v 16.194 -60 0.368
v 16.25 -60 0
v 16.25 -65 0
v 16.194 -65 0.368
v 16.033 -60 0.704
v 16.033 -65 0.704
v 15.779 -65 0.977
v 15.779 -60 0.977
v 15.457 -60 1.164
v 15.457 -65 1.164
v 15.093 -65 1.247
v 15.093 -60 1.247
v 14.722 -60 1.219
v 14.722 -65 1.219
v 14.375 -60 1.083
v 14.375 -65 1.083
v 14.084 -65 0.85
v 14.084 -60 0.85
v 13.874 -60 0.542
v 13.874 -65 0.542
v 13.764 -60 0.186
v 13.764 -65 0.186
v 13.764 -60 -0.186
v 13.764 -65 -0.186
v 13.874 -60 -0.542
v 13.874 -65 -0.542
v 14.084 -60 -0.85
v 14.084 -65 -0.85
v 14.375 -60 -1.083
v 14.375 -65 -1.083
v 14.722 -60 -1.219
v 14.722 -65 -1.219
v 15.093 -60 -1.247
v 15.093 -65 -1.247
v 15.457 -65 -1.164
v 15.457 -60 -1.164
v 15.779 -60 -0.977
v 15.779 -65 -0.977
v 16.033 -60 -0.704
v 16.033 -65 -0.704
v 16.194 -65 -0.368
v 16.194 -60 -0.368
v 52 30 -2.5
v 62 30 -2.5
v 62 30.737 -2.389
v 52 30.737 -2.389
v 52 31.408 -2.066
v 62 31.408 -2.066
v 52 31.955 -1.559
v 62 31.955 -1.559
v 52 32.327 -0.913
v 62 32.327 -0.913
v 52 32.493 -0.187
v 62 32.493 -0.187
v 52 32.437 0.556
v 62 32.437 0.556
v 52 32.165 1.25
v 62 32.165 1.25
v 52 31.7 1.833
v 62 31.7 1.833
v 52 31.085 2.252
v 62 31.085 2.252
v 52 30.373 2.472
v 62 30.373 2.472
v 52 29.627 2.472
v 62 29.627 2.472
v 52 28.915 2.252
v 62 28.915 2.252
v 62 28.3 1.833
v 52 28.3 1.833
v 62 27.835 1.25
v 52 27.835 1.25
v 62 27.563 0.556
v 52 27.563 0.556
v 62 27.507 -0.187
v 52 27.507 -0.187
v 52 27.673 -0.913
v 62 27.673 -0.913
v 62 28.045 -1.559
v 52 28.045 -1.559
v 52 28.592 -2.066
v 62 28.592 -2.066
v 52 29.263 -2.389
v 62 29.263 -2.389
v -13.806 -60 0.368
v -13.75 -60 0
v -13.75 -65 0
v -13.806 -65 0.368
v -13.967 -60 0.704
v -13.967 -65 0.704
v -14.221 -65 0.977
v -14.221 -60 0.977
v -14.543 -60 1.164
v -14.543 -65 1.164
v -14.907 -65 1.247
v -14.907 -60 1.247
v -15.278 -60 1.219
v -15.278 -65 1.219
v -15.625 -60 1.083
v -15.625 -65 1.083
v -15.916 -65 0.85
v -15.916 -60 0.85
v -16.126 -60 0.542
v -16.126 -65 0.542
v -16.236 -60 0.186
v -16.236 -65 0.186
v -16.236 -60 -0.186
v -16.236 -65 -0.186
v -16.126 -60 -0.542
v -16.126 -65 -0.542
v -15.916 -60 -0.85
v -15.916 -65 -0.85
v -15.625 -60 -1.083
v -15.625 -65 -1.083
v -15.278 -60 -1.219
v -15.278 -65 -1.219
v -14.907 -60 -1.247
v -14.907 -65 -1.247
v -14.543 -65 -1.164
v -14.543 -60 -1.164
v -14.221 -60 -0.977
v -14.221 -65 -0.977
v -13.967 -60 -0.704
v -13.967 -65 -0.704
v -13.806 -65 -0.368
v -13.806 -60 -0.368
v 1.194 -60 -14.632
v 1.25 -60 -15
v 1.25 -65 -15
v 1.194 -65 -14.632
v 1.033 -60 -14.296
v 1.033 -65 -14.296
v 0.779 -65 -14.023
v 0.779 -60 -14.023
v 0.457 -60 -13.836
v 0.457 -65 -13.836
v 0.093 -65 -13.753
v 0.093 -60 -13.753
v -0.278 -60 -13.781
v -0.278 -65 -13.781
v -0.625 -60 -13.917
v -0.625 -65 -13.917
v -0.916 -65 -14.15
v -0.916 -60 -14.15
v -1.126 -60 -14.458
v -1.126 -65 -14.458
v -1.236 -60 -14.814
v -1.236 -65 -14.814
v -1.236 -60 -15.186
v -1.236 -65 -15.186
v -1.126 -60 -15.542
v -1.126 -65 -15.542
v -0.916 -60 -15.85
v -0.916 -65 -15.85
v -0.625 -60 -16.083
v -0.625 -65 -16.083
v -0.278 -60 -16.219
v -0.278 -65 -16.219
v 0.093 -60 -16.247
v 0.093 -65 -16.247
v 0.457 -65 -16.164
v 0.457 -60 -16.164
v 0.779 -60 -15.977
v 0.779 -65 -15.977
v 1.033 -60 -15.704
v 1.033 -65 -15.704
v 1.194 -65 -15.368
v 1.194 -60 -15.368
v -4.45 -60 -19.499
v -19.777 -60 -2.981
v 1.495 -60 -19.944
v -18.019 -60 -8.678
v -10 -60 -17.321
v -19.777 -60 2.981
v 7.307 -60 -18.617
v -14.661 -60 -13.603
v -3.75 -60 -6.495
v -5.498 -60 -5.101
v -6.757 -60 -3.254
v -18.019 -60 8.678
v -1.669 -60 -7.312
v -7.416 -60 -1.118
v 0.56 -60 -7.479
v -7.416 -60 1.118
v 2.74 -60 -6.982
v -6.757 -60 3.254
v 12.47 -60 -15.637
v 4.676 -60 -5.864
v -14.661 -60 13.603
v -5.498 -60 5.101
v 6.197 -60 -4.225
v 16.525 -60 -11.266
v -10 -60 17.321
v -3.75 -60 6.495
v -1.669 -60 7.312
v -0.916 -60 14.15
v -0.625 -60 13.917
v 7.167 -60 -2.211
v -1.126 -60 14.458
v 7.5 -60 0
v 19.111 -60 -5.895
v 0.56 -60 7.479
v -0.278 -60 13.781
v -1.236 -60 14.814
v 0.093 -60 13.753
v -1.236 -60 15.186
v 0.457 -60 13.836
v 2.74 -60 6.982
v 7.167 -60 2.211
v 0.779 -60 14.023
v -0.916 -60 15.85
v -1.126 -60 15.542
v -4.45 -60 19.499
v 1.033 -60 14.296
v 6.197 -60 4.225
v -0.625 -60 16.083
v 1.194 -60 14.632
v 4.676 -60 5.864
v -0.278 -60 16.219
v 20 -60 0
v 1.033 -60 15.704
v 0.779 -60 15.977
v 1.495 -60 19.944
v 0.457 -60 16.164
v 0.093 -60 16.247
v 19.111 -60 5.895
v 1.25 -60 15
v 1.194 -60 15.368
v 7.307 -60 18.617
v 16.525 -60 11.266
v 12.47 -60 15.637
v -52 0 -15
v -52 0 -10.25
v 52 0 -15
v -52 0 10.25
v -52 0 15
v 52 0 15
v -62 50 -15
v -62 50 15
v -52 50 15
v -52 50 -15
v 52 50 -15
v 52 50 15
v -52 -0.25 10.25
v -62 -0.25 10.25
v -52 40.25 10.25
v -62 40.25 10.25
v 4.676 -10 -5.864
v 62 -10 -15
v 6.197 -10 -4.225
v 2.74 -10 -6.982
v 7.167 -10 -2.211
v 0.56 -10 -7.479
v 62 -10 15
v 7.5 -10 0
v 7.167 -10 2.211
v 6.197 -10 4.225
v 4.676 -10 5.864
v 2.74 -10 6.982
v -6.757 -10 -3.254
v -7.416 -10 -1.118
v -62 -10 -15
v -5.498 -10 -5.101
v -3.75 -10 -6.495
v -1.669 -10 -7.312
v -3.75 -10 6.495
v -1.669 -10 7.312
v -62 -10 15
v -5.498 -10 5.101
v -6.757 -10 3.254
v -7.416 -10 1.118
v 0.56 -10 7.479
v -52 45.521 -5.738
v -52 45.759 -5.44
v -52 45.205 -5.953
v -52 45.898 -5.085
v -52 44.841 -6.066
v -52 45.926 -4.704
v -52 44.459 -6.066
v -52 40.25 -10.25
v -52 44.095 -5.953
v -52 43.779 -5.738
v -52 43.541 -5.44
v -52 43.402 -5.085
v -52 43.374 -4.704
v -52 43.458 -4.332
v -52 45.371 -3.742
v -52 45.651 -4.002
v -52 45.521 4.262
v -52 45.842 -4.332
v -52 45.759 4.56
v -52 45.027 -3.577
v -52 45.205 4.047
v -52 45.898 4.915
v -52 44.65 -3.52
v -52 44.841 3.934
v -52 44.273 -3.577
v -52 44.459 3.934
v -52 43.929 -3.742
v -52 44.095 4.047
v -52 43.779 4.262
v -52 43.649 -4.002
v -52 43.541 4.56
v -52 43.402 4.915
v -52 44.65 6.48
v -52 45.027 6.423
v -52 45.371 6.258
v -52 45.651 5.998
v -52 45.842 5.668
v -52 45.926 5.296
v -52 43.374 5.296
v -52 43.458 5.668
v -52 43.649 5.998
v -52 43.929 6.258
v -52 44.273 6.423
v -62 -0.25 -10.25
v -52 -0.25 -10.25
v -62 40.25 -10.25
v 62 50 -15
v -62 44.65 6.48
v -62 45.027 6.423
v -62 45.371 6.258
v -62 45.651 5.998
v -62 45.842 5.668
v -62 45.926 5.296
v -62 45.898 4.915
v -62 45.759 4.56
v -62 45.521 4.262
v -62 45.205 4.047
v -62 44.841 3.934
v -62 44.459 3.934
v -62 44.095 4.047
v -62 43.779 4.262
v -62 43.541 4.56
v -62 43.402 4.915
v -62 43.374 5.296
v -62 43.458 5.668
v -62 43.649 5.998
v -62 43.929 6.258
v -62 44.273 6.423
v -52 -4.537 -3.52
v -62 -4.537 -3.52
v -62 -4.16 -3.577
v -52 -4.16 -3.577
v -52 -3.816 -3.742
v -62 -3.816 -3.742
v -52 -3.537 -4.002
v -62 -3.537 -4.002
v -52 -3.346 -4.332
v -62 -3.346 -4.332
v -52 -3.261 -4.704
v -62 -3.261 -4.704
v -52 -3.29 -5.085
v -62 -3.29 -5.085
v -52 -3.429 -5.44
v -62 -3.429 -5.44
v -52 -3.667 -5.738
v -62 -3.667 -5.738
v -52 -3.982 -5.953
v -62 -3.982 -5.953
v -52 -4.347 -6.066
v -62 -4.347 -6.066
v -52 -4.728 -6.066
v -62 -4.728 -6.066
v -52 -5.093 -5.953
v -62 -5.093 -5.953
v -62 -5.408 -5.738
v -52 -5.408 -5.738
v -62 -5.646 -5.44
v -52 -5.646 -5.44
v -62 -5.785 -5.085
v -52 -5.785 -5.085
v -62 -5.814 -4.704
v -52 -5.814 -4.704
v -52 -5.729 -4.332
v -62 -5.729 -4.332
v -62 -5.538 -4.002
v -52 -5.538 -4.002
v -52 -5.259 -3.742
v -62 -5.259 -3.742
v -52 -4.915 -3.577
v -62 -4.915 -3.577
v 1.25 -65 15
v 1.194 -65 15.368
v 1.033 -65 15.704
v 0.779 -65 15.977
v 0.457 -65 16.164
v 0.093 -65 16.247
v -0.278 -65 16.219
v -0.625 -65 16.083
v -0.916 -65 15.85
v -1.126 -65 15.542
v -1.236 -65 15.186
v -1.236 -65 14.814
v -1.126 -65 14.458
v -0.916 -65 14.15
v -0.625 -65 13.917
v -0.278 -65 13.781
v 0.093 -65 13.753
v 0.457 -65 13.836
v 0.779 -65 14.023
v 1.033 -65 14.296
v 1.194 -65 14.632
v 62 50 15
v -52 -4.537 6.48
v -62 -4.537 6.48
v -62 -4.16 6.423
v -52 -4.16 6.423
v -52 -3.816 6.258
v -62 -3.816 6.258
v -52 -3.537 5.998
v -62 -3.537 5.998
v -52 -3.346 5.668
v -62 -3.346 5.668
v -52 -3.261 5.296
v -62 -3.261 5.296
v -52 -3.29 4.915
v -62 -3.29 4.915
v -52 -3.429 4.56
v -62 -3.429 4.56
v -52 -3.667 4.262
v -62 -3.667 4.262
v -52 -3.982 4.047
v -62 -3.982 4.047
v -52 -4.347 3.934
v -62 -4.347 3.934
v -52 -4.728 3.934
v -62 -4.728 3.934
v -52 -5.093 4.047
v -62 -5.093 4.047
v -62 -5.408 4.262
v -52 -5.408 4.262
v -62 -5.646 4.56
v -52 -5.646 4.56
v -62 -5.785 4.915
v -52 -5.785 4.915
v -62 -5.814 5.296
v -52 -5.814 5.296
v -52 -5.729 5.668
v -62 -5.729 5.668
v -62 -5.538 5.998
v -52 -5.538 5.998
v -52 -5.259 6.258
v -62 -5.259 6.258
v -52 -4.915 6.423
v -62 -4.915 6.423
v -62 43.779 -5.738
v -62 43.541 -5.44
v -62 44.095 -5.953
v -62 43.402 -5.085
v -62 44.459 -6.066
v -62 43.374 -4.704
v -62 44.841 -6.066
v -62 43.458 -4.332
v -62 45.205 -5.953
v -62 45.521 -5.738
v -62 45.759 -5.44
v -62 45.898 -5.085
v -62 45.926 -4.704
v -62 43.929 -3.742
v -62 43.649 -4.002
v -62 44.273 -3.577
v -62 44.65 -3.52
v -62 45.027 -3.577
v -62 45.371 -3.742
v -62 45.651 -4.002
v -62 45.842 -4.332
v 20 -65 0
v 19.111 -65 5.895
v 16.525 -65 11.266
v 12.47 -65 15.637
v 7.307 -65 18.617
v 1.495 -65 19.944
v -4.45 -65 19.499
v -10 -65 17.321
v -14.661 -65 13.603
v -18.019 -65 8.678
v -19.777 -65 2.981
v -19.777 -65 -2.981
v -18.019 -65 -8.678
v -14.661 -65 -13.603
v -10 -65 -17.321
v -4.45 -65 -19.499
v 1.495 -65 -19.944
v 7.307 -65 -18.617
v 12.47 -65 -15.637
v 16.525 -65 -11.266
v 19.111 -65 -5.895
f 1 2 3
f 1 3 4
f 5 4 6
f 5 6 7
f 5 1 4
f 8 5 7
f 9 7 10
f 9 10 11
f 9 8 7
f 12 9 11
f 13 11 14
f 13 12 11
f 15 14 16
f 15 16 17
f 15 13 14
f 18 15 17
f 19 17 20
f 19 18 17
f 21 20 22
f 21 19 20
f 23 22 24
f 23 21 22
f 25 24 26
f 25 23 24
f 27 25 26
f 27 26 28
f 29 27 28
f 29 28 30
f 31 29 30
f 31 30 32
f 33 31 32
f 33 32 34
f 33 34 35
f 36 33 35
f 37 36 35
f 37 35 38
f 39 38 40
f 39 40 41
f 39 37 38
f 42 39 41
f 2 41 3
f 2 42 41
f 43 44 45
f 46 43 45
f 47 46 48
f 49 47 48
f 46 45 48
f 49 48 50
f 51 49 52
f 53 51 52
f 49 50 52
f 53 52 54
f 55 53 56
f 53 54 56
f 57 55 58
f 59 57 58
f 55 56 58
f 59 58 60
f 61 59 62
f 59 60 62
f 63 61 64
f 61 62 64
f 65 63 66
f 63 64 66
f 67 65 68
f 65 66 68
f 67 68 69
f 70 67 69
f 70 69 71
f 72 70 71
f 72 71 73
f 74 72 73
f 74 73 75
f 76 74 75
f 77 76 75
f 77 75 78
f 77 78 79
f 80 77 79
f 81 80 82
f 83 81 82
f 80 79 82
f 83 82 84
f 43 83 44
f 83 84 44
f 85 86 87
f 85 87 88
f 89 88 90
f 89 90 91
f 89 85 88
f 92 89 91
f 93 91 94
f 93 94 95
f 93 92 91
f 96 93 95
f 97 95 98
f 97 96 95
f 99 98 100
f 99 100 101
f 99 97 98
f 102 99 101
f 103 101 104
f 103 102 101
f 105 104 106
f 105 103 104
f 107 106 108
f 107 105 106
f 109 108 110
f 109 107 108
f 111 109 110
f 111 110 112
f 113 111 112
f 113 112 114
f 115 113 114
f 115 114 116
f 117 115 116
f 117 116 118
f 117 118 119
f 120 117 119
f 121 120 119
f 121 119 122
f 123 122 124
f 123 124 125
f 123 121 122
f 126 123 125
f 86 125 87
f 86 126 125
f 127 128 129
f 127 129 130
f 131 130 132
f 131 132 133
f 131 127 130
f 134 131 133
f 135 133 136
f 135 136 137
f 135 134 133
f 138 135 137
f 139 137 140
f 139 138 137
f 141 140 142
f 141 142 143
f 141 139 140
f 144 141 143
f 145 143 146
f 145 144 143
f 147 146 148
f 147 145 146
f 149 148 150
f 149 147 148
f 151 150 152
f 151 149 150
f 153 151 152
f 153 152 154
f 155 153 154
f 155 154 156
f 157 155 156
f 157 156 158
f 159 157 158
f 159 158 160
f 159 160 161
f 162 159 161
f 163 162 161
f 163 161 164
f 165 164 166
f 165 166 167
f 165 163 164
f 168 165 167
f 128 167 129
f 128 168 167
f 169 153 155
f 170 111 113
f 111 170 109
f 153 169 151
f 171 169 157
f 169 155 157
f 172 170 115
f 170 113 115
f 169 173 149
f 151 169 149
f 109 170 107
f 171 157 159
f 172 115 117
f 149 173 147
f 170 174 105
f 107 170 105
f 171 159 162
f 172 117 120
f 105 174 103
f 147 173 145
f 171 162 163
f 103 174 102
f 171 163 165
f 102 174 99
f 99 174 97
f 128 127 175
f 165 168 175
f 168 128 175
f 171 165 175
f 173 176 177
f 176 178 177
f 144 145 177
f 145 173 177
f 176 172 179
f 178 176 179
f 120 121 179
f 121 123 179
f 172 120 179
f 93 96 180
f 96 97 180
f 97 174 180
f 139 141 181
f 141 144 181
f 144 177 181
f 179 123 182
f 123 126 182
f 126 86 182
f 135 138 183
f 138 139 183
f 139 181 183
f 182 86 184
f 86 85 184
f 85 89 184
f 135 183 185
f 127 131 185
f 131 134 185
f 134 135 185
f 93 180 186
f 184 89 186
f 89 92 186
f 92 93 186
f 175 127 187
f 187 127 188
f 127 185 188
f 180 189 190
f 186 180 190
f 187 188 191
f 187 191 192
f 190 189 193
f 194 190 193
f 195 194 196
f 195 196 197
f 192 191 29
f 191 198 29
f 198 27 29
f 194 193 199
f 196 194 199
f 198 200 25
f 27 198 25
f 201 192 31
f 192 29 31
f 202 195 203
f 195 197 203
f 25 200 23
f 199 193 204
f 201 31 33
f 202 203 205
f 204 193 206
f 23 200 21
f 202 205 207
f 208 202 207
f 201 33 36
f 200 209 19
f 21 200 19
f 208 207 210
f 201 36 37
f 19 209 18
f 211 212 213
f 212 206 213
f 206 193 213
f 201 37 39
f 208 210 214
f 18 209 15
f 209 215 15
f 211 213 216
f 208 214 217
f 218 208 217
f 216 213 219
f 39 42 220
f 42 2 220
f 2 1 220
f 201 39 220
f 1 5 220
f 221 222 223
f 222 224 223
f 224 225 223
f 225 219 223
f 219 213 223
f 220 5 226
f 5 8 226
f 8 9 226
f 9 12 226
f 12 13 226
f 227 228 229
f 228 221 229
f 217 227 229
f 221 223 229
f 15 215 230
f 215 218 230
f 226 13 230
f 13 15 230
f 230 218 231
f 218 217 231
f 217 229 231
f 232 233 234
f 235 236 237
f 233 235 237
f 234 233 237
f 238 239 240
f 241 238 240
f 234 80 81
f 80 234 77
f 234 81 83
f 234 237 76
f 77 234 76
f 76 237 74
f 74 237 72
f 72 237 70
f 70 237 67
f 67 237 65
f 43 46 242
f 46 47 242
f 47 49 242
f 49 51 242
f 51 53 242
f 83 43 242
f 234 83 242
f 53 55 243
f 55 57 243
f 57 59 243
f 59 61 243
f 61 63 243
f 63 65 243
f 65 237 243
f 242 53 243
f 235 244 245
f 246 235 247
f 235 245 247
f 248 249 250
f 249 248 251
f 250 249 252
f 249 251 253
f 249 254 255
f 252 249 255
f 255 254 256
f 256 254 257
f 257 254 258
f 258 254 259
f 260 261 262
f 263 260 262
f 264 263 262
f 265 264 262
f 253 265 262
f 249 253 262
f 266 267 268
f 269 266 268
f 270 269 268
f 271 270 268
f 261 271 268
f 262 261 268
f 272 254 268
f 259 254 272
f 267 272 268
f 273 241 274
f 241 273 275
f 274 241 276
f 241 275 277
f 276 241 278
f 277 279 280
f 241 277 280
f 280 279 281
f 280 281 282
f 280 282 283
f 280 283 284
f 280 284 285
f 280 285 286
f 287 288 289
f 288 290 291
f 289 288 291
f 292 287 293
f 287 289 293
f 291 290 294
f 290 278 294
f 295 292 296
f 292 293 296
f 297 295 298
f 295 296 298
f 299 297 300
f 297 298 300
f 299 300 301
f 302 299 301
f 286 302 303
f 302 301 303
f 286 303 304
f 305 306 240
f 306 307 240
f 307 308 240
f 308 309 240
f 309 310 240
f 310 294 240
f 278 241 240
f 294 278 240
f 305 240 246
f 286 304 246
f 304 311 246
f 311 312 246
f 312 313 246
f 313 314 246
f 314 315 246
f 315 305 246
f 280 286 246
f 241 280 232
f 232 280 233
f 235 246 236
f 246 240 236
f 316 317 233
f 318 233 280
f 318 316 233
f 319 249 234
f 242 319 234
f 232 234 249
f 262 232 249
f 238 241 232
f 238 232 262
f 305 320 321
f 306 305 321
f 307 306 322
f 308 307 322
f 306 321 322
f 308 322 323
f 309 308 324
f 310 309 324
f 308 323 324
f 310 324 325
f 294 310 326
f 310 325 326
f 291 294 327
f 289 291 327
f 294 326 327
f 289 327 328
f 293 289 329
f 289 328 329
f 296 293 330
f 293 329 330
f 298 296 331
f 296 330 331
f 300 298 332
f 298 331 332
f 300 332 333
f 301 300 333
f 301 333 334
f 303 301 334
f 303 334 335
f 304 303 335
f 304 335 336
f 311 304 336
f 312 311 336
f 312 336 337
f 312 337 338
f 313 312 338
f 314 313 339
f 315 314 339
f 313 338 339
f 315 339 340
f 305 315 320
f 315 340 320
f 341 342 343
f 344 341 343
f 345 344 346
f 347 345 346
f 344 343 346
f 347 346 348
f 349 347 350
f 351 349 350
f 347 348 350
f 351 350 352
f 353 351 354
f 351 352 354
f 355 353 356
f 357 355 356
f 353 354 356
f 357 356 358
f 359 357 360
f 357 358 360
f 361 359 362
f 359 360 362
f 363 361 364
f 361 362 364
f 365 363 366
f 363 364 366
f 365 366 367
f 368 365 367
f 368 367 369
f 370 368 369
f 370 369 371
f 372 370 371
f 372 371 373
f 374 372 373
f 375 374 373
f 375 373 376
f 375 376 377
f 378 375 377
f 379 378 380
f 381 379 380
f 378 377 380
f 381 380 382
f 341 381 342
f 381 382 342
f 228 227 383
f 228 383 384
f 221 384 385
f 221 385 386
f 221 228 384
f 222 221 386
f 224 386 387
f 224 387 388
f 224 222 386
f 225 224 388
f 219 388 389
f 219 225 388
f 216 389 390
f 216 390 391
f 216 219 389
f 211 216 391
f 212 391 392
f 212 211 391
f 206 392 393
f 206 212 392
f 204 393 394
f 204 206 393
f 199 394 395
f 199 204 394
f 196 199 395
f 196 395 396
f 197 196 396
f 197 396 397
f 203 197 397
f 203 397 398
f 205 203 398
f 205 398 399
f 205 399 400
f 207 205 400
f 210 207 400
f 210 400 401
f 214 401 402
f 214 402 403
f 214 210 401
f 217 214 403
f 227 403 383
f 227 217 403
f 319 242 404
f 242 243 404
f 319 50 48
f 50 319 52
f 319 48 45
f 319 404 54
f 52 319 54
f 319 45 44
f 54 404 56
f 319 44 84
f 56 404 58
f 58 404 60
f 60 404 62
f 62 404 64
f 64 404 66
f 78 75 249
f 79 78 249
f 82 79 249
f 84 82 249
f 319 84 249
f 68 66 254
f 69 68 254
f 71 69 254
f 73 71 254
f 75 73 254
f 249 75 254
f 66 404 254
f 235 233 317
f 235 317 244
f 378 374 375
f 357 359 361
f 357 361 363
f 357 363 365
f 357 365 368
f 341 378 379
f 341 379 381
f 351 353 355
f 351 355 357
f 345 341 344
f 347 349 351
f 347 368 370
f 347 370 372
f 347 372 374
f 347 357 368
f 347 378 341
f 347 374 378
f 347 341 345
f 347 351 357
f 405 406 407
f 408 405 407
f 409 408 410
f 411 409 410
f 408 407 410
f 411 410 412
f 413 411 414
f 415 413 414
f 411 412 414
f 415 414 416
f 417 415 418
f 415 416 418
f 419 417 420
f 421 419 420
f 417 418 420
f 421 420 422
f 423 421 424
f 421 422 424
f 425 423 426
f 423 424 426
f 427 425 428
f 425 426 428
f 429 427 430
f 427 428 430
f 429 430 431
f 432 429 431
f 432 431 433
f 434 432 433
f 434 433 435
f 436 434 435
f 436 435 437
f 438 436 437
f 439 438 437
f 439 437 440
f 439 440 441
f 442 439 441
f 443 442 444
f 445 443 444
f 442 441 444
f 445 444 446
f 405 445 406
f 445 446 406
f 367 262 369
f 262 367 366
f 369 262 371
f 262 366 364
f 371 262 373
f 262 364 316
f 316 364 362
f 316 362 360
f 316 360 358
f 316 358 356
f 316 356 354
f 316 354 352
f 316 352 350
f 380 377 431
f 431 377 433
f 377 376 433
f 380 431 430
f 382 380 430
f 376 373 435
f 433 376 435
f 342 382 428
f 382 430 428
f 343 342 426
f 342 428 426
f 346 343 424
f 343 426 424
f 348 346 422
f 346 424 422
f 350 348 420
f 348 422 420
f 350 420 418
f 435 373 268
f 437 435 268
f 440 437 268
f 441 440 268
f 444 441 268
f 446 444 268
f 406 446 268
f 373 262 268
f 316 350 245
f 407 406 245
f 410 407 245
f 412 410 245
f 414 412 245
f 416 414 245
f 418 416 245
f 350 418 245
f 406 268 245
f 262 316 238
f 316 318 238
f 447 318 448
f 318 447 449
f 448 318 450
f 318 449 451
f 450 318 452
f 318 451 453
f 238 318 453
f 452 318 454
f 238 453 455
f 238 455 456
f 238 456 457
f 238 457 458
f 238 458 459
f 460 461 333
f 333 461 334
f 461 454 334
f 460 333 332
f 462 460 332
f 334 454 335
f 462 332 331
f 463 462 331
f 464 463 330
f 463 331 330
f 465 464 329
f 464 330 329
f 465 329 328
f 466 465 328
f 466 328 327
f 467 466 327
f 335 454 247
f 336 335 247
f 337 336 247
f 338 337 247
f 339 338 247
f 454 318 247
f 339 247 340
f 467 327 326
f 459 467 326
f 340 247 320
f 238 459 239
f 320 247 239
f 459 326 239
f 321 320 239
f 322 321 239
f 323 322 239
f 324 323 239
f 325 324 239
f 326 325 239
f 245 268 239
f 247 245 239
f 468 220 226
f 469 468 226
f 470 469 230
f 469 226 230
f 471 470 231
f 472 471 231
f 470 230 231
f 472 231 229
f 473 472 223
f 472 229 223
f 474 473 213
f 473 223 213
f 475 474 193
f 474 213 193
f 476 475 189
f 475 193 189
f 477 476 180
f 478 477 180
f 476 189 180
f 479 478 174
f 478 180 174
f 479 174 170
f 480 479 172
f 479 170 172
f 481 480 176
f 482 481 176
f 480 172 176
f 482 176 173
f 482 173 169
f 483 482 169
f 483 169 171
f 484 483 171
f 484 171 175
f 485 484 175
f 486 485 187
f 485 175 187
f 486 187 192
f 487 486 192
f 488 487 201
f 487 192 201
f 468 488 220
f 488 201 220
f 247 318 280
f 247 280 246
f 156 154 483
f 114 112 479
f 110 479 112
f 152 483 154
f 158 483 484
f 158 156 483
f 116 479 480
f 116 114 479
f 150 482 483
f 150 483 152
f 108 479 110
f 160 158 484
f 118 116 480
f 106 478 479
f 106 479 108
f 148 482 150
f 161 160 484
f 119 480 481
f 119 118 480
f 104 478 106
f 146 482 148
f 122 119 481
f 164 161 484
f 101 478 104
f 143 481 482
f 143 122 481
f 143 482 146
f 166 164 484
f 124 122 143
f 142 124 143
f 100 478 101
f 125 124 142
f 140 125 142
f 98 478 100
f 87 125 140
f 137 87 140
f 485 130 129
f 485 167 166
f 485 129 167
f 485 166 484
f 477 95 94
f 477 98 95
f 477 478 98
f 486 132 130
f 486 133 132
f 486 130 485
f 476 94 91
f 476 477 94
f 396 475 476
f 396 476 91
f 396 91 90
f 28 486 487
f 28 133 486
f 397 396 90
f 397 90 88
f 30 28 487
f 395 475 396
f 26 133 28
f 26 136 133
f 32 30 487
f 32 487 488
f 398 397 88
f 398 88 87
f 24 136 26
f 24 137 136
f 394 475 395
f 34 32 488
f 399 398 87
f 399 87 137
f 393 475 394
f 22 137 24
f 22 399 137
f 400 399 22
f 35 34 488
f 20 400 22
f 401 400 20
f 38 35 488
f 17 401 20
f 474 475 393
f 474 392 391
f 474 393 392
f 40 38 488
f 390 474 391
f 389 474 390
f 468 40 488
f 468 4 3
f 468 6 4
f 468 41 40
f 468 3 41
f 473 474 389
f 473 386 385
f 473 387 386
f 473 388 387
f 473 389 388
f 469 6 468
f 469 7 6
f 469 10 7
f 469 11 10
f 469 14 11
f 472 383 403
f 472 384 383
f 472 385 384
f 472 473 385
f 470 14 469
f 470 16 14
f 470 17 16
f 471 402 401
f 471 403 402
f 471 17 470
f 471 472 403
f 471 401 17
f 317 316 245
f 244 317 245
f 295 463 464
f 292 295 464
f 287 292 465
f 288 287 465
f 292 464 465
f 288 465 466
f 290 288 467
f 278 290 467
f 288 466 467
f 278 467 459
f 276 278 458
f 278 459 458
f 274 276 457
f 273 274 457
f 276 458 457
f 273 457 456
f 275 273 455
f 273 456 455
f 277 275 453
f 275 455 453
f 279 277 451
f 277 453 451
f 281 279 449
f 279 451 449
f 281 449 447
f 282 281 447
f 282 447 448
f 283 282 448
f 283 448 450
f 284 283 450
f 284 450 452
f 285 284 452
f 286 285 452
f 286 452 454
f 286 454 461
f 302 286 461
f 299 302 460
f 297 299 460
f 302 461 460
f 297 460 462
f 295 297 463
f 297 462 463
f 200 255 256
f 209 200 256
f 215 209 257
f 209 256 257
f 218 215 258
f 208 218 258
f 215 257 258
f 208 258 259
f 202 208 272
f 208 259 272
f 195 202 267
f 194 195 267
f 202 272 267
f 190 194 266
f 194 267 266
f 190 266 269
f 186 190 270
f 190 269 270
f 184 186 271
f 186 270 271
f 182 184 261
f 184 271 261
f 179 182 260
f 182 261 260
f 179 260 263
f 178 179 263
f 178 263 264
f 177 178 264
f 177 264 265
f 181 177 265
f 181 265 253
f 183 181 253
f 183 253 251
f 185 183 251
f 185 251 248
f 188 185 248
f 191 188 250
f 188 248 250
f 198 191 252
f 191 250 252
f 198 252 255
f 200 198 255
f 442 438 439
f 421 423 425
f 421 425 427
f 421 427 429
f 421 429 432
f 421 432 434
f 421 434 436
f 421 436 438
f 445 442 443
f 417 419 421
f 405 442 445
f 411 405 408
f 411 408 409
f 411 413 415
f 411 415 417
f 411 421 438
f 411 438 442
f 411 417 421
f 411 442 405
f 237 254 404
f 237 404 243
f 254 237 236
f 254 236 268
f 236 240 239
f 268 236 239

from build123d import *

# Parameters (mm, degrees)
BOSS_EXTRUDE1_DEPTH = 15
SKETCH3_R           = 7.5
BOSS_EXTRUDE2_DEPTH = 50
SKETCH4_R           = 20
SKETCH4_R_2         = 1.25
BOSS_EXTRUDE3_DEPTH = 5
SKETCH5_R           = 1.28
SKETCH5_W           = 20.5
SKETCH5_H           = 40.5
CUT_EXTRUDE1_DEPTH  = 10
SKETCH7_R           = 2.5
CUT_EXTRUDE2_DEPTH  = 10


with BuildPart() as part:
    # Sketch1 → Boss-Extrude1 (new body, symmetric)
    with BuildSketch(Plane.XY):
        Polygon((-52, 50), (-52, 0), (52, 0), (52, 50), (62, 50), (62, -10), (-62, -10), (-62, 50), align=None)
    extrude(amount=BOSS_EXTRUDE1_DEPTH, both=True)

    # Sketch3 → Boss-Extrude2 (add)
    with BuildSketch(Plane.XZ.offset(10)):
        Circle(SKETCH3_R)
    extrude(amount=BOSS_EXTRUDE2_DEPTH)

    # Sketch4 → Boss-Extrude3 (add)
    with BuildSketch(Plane.XZ.offset(60)):
        Circle(SKETCH4_R)
        with Locations((0, 15)):
            Circle(SKETCH4_R_2, mode=Mode.SUBTRACT)
        with Locations((-15, 0)):
            Circle(SKETCH4_R_2, mode=Mode.SUBTRACT)
        with Locations((15, 0)):
            Circle(SKETCH4_R_2, mode=Mode.SUBTRACT)
        with Locations((0, -15)):
            Circle(SKETCH4_R_2, mode=Mode.SUBTRACT)
    extrude(amount=BOSS_EXTRUDE3_DEPTH)

    # Sketch5 → Cut-Extrude1 (cut)
    with BuildSketch(Plane.ZY.offset(62)):
        with Locations((-4.8, 44.65)):
            Circle(SKETCH5_R)
        with Locations((5.2, 44.65)):
            Circle(SKETCH5_R)
        with Locations((-4.8, -4.537471889)):
            Circle(SKETCH5_R)
        with Locations((5.2, -4.537471889)):
            Circle(SKETCH5_R)
        with Locations((0, 20)):
            Rectangle(SKETCH5_W, SKETCH5_H)
    extrude(amount=-CUT_EXTRUDE1_DEPTH, mode=Mode.SUBTRACT)

    # Sketch7 → Cut-Extrude2 (cut)
    with BuildSketch(Plane(origin=(62, 0, 0), x_dir=(0, 0, -1), z_dir=(1, 0, 0))):
        with Locations((0, 30)):
            Circle(SKETCH7_R)
    extrude(amount=-CUT_EXTRUDE2_DEPTH, mode=Mode.SUBTRACT)


solid = part.part
